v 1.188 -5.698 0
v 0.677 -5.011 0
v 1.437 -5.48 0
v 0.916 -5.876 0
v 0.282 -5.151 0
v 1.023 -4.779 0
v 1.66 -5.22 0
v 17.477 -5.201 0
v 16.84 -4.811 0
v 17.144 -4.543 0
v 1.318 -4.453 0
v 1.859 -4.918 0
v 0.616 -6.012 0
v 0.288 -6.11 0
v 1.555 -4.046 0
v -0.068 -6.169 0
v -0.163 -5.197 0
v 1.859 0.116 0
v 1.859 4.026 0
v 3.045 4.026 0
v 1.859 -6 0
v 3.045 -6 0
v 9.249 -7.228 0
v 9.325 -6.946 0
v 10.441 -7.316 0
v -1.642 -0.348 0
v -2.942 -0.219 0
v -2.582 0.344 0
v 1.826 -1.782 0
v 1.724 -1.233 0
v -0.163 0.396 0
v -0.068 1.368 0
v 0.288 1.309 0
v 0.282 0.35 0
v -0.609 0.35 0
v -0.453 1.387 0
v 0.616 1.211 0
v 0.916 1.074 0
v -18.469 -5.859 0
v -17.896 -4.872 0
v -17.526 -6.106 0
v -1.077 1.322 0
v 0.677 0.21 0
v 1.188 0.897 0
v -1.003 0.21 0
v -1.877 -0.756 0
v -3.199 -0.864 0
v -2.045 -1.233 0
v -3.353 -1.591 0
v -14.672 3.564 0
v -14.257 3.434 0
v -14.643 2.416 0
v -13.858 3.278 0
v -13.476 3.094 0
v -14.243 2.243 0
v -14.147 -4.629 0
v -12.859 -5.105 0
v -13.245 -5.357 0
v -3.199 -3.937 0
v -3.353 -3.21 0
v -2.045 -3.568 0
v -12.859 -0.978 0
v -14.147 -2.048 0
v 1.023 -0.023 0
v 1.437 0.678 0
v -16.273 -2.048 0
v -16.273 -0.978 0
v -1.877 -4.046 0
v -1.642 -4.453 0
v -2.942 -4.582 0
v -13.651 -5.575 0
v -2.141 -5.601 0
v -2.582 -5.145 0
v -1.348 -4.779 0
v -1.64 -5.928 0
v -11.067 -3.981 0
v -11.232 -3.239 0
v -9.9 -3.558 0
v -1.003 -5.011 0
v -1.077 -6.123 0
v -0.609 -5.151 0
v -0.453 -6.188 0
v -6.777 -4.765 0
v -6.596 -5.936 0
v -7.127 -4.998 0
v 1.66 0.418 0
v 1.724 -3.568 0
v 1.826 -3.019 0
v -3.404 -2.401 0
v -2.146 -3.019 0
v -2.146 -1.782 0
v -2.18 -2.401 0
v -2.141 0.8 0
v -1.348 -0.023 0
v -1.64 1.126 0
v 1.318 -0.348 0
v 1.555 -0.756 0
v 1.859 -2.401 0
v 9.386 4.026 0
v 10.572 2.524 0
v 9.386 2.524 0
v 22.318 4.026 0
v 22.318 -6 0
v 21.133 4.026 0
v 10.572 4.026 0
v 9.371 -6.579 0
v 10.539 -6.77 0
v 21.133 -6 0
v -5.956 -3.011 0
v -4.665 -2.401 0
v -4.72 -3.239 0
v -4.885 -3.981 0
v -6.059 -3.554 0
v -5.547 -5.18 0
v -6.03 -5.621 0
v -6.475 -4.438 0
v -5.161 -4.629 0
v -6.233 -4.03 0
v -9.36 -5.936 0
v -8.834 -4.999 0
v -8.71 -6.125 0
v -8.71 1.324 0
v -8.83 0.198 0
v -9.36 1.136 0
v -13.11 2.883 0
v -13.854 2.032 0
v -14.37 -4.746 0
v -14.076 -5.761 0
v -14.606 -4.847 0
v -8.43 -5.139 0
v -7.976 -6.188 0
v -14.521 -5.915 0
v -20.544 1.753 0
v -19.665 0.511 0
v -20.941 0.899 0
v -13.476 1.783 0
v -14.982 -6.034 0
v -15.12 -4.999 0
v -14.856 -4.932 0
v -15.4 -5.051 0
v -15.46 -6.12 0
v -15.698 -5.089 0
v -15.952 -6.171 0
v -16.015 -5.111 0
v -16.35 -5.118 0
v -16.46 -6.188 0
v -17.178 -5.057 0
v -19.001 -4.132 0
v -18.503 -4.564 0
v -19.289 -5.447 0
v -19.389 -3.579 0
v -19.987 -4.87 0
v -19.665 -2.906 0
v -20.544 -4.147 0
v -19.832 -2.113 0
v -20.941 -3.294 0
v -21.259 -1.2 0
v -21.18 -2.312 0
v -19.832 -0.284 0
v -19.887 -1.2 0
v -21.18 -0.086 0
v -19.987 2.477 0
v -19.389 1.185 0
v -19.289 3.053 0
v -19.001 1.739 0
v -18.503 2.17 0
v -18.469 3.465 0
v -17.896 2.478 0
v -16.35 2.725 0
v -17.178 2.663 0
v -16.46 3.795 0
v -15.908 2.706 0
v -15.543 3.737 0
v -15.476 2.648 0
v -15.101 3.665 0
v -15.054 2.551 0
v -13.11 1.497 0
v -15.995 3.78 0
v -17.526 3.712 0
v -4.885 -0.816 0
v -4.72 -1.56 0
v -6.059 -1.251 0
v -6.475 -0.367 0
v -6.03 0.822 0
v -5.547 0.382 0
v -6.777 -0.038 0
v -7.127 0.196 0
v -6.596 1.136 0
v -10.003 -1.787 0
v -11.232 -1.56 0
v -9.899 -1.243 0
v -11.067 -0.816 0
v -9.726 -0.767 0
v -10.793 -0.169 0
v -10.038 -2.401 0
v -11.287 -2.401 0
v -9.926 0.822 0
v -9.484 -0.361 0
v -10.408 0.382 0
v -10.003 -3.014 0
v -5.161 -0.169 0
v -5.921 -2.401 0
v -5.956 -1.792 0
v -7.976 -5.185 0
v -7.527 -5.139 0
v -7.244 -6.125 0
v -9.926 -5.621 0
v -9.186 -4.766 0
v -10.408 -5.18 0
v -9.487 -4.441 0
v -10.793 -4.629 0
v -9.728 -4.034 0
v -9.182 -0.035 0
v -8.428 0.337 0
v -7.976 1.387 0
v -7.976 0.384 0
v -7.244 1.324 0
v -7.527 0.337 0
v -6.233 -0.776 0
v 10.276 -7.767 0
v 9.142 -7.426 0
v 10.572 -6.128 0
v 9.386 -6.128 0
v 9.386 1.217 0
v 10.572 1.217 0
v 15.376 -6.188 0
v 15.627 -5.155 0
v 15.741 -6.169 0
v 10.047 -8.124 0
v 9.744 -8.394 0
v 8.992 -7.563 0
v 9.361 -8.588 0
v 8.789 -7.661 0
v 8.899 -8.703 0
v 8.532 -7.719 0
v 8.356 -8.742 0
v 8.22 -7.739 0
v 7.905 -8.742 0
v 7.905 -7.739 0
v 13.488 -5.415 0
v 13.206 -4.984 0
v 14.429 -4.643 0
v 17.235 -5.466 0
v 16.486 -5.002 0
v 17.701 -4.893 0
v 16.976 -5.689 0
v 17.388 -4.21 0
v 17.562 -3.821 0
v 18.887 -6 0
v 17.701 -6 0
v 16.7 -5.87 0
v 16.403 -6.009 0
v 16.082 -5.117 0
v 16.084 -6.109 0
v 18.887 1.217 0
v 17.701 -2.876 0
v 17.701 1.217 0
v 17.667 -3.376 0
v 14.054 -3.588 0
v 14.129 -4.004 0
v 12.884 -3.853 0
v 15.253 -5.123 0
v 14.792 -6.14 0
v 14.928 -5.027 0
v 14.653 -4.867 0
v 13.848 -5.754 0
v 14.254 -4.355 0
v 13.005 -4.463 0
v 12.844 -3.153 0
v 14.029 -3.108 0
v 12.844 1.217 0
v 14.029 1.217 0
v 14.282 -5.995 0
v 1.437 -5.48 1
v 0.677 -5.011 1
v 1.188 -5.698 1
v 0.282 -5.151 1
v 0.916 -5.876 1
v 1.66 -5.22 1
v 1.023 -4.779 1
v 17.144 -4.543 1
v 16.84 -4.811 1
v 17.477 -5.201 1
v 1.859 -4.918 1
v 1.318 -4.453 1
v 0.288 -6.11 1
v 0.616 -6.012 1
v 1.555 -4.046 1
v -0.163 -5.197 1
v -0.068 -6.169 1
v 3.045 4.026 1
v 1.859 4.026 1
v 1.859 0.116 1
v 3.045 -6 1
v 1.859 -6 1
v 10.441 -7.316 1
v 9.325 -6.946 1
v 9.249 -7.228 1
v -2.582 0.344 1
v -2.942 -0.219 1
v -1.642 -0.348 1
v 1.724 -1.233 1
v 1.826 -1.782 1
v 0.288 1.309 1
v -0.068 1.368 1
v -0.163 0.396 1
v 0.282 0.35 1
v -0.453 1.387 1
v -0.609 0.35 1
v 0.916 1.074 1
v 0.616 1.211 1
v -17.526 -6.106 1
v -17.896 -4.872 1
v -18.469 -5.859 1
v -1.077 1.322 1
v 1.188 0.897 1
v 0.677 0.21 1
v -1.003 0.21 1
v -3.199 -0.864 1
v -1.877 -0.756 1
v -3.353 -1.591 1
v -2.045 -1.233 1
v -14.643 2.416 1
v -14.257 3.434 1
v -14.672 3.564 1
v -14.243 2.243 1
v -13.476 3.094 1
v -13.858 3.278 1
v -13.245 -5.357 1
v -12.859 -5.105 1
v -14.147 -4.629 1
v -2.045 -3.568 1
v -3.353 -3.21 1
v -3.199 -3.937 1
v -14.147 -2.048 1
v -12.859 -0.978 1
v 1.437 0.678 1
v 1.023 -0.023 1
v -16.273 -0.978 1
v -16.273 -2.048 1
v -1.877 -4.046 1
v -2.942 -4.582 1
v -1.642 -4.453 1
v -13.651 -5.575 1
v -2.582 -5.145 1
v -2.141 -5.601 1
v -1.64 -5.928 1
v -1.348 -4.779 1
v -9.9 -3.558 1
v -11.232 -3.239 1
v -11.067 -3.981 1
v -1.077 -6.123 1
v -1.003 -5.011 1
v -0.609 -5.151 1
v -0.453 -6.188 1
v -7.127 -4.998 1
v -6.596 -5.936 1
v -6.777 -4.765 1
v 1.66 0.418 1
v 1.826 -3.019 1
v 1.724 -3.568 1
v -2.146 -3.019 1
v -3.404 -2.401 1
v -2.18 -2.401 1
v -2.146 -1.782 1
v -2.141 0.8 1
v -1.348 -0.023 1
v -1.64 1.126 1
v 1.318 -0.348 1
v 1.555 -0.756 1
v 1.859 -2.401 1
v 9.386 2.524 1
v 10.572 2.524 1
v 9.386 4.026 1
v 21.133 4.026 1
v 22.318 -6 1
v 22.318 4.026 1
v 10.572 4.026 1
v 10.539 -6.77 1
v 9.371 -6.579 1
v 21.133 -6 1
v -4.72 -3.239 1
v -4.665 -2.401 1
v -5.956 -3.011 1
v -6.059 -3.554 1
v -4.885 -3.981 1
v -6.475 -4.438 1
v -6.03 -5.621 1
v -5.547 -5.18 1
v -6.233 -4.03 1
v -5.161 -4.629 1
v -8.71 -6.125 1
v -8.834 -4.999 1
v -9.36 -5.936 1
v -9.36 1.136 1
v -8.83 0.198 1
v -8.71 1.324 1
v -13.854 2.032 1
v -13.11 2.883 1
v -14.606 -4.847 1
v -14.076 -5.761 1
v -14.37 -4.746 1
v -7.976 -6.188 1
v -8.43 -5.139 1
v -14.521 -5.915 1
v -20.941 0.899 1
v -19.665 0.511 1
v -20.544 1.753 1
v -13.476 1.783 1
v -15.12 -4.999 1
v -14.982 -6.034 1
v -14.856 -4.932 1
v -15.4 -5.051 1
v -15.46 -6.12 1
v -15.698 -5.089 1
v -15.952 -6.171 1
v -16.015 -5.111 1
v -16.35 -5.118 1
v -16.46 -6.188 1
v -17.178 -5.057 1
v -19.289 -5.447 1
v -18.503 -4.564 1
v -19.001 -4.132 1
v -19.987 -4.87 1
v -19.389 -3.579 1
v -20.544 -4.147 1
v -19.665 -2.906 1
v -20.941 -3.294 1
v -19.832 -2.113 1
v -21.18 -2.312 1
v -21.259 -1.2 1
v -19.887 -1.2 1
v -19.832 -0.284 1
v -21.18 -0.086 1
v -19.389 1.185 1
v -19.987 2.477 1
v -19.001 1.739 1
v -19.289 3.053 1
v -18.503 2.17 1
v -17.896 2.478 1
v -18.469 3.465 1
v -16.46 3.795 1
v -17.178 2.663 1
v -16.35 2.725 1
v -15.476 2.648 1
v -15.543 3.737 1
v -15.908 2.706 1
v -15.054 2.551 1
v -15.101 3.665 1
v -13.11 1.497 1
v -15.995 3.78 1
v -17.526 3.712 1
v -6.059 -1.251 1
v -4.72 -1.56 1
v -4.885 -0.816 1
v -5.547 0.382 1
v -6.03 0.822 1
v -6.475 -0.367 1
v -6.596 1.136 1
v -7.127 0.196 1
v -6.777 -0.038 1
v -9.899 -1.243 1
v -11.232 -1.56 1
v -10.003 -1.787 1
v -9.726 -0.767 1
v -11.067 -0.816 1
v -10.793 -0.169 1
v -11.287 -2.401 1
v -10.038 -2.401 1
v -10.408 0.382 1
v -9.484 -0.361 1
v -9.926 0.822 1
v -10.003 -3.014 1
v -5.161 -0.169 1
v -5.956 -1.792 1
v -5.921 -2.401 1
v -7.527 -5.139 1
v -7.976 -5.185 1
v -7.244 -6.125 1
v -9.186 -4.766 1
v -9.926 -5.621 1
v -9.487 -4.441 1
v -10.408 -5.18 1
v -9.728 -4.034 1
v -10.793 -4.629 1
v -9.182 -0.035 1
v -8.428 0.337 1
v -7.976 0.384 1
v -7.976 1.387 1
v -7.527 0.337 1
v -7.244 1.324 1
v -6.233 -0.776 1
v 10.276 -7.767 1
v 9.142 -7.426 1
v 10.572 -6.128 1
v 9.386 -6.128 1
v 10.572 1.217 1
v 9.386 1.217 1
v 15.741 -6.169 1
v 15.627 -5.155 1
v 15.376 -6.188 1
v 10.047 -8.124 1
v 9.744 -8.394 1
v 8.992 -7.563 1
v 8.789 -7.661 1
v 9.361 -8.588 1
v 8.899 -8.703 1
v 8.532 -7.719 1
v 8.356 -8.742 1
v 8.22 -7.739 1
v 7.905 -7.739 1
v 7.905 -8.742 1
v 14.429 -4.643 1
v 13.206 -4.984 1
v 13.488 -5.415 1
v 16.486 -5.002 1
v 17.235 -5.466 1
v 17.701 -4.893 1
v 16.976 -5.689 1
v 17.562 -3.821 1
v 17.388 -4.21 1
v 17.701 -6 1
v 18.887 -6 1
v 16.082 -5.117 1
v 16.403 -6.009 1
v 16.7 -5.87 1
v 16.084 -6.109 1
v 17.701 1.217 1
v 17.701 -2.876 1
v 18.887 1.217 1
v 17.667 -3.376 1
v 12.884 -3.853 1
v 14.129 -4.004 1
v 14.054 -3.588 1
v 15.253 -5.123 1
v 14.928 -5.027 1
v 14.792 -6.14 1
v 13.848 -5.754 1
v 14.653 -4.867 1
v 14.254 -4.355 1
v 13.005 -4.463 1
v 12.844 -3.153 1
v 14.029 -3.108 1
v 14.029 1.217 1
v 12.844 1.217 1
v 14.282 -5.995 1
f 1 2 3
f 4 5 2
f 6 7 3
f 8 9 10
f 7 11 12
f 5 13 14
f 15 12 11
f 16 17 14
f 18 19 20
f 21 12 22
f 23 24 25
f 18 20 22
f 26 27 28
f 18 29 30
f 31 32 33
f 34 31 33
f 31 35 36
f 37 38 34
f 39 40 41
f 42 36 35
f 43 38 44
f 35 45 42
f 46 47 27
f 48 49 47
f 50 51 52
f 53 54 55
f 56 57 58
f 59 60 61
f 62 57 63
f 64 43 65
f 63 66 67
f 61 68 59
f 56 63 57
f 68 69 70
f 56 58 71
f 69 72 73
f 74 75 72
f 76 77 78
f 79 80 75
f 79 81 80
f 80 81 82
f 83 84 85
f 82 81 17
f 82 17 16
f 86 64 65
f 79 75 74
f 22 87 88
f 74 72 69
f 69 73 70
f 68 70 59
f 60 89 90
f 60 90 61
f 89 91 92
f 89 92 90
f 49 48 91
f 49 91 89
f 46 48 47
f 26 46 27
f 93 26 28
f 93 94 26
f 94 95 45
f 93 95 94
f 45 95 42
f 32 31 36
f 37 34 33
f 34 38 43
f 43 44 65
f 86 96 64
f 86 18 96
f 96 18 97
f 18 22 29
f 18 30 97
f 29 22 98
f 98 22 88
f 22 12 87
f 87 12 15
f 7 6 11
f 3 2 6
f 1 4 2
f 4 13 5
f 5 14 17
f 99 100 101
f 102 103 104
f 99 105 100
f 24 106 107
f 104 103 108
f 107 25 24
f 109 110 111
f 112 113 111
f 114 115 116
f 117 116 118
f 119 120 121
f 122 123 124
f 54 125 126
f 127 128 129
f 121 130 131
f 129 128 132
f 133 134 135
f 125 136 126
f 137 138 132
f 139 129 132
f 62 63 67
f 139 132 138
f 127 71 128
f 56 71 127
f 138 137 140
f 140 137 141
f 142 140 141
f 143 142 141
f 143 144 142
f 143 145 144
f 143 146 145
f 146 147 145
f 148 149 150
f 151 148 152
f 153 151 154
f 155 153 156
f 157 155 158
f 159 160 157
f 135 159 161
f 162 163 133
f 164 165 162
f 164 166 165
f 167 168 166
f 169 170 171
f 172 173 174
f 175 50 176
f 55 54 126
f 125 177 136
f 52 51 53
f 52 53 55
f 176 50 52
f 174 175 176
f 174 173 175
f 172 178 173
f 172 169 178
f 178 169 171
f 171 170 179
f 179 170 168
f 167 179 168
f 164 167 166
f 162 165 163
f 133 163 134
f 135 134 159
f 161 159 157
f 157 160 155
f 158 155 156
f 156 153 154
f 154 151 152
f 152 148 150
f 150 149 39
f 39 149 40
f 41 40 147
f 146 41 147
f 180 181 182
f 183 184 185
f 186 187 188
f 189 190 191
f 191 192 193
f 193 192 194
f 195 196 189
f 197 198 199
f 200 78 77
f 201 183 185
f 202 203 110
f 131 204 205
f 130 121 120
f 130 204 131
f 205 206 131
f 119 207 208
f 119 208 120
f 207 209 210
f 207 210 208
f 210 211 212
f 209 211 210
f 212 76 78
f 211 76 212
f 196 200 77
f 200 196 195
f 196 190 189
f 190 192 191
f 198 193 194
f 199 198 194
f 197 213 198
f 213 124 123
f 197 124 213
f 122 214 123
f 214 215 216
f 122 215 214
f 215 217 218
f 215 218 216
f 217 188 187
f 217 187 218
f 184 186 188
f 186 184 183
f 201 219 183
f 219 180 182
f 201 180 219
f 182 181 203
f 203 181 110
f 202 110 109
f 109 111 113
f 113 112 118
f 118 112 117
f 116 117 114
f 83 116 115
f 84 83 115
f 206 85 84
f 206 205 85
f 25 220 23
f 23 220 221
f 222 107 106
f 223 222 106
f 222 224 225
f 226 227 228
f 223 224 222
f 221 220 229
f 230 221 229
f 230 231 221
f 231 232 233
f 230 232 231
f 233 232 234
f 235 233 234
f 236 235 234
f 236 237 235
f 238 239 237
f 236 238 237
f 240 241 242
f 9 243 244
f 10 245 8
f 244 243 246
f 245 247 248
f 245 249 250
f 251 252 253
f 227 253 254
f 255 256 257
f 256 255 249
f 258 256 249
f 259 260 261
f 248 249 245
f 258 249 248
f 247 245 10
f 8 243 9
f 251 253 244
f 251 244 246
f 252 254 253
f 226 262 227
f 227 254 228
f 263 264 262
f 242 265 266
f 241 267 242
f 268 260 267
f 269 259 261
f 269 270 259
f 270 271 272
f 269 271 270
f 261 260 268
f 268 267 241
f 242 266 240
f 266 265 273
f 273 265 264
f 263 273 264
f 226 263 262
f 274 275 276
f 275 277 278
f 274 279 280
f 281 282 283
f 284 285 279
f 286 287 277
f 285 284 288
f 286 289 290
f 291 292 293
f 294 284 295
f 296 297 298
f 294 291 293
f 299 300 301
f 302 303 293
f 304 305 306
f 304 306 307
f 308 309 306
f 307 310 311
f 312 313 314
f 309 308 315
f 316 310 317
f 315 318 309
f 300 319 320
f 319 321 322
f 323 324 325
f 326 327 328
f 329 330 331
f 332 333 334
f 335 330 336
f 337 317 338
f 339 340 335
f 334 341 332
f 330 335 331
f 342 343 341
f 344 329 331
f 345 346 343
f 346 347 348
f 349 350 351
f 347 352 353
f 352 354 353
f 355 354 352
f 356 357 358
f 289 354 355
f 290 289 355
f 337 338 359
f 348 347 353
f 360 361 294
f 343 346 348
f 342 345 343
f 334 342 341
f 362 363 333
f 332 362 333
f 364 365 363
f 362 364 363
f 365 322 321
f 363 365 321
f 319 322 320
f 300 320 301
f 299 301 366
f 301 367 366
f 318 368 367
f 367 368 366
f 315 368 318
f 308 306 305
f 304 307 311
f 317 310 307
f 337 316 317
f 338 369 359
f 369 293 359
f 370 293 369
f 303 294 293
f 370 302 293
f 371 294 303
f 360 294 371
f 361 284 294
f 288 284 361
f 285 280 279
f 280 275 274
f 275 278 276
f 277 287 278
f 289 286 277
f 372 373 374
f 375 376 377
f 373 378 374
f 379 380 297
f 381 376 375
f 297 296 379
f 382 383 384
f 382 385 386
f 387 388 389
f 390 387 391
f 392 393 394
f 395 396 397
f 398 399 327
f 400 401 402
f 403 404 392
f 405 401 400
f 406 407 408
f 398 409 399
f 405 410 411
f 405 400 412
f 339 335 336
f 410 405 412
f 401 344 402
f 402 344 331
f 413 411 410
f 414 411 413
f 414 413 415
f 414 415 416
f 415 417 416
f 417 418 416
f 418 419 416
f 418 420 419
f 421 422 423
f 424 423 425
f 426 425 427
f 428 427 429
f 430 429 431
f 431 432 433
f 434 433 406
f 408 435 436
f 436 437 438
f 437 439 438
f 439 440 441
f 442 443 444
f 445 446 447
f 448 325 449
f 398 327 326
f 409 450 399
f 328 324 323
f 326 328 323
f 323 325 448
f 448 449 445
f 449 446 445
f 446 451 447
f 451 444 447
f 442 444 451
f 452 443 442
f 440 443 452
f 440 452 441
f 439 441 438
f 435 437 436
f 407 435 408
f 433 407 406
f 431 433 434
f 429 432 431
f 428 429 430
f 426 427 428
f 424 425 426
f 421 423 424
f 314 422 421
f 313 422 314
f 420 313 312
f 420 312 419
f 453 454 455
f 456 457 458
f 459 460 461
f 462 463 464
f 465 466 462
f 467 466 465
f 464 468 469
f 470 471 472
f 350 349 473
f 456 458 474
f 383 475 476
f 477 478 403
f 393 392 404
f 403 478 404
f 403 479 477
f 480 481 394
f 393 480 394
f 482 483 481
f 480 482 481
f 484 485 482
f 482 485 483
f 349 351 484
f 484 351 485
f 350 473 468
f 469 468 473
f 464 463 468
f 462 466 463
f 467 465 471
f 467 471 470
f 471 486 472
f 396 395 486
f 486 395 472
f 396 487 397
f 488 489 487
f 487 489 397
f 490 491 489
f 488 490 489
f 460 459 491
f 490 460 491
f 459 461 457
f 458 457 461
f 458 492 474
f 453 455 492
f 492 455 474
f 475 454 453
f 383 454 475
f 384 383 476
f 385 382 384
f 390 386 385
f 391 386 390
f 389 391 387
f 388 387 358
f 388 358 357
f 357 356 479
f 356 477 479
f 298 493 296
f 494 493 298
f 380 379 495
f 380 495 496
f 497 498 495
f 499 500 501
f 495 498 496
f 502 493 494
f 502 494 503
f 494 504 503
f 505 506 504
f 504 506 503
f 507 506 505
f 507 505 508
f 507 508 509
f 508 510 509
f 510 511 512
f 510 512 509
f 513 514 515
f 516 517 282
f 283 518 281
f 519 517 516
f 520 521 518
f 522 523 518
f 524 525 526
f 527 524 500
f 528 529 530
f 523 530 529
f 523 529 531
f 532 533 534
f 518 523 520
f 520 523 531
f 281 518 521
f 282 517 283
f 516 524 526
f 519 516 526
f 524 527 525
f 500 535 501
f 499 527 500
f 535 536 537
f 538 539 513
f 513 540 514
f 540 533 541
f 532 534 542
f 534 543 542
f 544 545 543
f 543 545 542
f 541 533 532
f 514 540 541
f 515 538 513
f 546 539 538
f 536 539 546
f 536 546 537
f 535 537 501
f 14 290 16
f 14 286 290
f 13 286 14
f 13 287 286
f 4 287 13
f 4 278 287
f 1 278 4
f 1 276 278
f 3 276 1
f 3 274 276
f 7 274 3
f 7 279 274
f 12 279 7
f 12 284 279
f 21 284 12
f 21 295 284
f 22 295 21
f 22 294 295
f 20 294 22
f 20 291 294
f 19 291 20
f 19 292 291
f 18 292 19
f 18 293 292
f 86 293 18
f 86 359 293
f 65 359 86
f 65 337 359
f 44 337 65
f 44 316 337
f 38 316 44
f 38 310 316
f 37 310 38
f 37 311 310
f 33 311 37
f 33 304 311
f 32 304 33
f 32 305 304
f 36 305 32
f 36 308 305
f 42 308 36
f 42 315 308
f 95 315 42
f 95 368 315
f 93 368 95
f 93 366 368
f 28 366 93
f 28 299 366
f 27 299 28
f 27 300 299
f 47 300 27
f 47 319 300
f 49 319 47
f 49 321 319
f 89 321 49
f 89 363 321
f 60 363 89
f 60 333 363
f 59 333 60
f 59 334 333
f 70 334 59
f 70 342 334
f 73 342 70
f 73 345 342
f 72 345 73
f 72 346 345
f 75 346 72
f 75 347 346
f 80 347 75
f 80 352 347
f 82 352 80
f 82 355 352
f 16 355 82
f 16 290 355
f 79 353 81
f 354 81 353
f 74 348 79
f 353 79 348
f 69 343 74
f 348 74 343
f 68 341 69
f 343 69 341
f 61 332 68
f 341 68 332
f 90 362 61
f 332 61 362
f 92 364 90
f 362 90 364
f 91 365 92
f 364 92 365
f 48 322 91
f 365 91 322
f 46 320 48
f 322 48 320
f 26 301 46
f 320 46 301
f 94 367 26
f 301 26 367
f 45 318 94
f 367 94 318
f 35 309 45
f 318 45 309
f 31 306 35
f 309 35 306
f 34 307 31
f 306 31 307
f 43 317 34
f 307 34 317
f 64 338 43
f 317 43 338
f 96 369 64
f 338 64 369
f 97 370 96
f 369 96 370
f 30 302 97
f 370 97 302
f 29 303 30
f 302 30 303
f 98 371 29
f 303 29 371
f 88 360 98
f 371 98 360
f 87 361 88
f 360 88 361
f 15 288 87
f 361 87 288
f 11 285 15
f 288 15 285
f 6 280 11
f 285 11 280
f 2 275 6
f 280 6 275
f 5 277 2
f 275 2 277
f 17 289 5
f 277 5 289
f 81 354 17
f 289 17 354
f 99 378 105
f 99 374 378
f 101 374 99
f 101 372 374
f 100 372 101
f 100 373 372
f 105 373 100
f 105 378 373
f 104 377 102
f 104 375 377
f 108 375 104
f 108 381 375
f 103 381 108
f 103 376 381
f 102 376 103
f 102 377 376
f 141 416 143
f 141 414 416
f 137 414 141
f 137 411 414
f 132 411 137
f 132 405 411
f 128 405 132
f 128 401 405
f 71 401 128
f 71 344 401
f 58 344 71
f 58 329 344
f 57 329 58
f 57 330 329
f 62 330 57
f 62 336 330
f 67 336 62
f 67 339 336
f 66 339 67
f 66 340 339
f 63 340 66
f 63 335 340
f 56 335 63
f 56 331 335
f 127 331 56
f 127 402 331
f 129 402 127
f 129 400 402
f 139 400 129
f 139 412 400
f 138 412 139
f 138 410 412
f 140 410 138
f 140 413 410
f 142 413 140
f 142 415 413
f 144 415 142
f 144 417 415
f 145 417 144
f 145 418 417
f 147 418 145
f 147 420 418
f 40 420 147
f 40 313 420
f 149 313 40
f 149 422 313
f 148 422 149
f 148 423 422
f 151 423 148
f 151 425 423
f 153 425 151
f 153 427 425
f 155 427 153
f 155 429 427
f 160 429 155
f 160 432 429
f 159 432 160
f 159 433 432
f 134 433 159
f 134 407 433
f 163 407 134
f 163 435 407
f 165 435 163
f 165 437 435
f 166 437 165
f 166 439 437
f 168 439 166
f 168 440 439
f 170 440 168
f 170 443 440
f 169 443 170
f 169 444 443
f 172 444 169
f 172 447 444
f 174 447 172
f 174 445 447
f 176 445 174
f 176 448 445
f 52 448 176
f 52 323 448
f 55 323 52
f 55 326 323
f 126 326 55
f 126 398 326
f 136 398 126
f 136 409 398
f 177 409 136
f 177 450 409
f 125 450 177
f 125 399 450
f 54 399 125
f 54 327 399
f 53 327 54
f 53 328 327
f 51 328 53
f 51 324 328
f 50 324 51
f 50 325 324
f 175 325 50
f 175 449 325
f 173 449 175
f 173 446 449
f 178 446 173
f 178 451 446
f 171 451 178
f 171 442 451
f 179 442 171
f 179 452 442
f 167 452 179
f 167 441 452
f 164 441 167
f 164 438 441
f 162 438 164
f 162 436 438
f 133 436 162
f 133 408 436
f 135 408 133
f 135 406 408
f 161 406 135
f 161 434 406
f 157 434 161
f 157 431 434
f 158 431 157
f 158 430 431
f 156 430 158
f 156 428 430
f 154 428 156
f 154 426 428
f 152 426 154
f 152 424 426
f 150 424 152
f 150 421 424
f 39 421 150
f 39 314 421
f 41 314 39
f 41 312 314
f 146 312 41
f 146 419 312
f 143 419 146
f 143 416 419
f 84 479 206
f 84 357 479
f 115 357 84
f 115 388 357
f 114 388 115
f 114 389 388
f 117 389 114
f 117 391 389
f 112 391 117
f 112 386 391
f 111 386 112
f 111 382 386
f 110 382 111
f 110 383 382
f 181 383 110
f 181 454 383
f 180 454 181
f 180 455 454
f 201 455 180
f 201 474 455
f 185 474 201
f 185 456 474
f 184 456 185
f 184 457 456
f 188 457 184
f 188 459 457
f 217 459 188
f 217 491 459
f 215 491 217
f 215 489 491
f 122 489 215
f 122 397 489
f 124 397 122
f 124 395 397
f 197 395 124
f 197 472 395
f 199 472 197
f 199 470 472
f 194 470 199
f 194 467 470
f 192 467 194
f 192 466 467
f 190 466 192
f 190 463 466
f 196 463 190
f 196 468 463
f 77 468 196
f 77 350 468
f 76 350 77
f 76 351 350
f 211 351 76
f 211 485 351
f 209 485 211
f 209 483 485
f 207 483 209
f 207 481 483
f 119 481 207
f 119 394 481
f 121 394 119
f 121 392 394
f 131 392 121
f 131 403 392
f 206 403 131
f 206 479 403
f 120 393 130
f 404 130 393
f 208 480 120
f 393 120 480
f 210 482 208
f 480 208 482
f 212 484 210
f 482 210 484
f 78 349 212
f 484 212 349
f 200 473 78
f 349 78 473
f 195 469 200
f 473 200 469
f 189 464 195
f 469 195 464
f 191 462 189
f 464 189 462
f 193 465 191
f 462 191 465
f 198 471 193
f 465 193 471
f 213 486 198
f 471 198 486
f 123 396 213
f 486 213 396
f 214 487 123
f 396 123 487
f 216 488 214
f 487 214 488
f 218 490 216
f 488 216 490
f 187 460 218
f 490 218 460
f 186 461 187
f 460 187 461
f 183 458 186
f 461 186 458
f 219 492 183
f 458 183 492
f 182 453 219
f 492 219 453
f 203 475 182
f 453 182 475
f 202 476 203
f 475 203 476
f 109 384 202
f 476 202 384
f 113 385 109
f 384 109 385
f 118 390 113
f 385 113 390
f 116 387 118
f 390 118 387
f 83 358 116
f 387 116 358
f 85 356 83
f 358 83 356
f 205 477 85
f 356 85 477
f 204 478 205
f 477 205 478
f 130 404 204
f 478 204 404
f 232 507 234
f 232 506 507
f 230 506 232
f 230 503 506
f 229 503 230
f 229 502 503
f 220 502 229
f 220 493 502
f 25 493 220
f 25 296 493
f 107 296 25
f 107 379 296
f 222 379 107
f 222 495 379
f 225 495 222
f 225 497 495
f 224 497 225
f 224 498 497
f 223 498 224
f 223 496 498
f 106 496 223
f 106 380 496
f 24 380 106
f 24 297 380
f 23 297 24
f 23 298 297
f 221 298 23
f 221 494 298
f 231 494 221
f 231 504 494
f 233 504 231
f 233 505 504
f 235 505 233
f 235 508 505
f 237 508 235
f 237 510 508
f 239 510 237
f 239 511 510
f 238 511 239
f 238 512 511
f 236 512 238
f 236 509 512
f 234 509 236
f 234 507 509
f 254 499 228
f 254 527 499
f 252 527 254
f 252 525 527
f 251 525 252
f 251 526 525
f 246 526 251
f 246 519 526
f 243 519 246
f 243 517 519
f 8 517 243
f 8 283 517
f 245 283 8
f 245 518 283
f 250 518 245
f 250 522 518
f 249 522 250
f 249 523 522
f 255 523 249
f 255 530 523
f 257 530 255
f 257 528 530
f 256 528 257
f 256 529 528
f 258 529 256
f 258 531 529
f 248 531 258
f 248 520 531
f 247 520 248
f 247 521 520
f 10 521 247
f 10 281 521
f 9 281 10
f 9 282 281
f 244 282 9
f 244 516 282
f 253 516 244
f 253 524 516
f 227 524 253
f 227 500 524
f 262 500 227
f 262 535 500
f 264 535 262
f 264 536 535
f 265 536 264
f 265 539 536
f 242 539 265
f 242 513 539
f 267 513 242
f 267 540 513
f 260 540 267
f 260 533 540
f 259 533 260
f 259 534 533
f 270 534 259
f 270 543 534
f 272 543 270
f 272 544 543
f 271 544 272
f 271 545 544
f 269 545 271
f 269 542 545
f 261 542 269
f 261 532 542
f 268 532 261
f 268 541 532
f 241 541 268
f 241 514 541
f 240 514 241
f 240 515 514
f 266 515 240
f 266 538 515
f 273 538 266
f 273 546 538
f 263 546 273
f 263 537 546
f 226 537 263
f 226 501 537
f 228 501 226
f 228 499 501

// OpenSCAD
fontface="Apple Chancery";
//fontface="Savoye LET";
//fontface="Zapfino";
fontsize=9.5;
test=false;

if (test) {
    width=44;
    translate([-width/2,fontsize*1.5])
        cube([width,2,1]);
}
linear_extrude(1) {
    translate([-22,-6]) {
        text("God jul", font=fontface, size=fontsize);
    }
}
